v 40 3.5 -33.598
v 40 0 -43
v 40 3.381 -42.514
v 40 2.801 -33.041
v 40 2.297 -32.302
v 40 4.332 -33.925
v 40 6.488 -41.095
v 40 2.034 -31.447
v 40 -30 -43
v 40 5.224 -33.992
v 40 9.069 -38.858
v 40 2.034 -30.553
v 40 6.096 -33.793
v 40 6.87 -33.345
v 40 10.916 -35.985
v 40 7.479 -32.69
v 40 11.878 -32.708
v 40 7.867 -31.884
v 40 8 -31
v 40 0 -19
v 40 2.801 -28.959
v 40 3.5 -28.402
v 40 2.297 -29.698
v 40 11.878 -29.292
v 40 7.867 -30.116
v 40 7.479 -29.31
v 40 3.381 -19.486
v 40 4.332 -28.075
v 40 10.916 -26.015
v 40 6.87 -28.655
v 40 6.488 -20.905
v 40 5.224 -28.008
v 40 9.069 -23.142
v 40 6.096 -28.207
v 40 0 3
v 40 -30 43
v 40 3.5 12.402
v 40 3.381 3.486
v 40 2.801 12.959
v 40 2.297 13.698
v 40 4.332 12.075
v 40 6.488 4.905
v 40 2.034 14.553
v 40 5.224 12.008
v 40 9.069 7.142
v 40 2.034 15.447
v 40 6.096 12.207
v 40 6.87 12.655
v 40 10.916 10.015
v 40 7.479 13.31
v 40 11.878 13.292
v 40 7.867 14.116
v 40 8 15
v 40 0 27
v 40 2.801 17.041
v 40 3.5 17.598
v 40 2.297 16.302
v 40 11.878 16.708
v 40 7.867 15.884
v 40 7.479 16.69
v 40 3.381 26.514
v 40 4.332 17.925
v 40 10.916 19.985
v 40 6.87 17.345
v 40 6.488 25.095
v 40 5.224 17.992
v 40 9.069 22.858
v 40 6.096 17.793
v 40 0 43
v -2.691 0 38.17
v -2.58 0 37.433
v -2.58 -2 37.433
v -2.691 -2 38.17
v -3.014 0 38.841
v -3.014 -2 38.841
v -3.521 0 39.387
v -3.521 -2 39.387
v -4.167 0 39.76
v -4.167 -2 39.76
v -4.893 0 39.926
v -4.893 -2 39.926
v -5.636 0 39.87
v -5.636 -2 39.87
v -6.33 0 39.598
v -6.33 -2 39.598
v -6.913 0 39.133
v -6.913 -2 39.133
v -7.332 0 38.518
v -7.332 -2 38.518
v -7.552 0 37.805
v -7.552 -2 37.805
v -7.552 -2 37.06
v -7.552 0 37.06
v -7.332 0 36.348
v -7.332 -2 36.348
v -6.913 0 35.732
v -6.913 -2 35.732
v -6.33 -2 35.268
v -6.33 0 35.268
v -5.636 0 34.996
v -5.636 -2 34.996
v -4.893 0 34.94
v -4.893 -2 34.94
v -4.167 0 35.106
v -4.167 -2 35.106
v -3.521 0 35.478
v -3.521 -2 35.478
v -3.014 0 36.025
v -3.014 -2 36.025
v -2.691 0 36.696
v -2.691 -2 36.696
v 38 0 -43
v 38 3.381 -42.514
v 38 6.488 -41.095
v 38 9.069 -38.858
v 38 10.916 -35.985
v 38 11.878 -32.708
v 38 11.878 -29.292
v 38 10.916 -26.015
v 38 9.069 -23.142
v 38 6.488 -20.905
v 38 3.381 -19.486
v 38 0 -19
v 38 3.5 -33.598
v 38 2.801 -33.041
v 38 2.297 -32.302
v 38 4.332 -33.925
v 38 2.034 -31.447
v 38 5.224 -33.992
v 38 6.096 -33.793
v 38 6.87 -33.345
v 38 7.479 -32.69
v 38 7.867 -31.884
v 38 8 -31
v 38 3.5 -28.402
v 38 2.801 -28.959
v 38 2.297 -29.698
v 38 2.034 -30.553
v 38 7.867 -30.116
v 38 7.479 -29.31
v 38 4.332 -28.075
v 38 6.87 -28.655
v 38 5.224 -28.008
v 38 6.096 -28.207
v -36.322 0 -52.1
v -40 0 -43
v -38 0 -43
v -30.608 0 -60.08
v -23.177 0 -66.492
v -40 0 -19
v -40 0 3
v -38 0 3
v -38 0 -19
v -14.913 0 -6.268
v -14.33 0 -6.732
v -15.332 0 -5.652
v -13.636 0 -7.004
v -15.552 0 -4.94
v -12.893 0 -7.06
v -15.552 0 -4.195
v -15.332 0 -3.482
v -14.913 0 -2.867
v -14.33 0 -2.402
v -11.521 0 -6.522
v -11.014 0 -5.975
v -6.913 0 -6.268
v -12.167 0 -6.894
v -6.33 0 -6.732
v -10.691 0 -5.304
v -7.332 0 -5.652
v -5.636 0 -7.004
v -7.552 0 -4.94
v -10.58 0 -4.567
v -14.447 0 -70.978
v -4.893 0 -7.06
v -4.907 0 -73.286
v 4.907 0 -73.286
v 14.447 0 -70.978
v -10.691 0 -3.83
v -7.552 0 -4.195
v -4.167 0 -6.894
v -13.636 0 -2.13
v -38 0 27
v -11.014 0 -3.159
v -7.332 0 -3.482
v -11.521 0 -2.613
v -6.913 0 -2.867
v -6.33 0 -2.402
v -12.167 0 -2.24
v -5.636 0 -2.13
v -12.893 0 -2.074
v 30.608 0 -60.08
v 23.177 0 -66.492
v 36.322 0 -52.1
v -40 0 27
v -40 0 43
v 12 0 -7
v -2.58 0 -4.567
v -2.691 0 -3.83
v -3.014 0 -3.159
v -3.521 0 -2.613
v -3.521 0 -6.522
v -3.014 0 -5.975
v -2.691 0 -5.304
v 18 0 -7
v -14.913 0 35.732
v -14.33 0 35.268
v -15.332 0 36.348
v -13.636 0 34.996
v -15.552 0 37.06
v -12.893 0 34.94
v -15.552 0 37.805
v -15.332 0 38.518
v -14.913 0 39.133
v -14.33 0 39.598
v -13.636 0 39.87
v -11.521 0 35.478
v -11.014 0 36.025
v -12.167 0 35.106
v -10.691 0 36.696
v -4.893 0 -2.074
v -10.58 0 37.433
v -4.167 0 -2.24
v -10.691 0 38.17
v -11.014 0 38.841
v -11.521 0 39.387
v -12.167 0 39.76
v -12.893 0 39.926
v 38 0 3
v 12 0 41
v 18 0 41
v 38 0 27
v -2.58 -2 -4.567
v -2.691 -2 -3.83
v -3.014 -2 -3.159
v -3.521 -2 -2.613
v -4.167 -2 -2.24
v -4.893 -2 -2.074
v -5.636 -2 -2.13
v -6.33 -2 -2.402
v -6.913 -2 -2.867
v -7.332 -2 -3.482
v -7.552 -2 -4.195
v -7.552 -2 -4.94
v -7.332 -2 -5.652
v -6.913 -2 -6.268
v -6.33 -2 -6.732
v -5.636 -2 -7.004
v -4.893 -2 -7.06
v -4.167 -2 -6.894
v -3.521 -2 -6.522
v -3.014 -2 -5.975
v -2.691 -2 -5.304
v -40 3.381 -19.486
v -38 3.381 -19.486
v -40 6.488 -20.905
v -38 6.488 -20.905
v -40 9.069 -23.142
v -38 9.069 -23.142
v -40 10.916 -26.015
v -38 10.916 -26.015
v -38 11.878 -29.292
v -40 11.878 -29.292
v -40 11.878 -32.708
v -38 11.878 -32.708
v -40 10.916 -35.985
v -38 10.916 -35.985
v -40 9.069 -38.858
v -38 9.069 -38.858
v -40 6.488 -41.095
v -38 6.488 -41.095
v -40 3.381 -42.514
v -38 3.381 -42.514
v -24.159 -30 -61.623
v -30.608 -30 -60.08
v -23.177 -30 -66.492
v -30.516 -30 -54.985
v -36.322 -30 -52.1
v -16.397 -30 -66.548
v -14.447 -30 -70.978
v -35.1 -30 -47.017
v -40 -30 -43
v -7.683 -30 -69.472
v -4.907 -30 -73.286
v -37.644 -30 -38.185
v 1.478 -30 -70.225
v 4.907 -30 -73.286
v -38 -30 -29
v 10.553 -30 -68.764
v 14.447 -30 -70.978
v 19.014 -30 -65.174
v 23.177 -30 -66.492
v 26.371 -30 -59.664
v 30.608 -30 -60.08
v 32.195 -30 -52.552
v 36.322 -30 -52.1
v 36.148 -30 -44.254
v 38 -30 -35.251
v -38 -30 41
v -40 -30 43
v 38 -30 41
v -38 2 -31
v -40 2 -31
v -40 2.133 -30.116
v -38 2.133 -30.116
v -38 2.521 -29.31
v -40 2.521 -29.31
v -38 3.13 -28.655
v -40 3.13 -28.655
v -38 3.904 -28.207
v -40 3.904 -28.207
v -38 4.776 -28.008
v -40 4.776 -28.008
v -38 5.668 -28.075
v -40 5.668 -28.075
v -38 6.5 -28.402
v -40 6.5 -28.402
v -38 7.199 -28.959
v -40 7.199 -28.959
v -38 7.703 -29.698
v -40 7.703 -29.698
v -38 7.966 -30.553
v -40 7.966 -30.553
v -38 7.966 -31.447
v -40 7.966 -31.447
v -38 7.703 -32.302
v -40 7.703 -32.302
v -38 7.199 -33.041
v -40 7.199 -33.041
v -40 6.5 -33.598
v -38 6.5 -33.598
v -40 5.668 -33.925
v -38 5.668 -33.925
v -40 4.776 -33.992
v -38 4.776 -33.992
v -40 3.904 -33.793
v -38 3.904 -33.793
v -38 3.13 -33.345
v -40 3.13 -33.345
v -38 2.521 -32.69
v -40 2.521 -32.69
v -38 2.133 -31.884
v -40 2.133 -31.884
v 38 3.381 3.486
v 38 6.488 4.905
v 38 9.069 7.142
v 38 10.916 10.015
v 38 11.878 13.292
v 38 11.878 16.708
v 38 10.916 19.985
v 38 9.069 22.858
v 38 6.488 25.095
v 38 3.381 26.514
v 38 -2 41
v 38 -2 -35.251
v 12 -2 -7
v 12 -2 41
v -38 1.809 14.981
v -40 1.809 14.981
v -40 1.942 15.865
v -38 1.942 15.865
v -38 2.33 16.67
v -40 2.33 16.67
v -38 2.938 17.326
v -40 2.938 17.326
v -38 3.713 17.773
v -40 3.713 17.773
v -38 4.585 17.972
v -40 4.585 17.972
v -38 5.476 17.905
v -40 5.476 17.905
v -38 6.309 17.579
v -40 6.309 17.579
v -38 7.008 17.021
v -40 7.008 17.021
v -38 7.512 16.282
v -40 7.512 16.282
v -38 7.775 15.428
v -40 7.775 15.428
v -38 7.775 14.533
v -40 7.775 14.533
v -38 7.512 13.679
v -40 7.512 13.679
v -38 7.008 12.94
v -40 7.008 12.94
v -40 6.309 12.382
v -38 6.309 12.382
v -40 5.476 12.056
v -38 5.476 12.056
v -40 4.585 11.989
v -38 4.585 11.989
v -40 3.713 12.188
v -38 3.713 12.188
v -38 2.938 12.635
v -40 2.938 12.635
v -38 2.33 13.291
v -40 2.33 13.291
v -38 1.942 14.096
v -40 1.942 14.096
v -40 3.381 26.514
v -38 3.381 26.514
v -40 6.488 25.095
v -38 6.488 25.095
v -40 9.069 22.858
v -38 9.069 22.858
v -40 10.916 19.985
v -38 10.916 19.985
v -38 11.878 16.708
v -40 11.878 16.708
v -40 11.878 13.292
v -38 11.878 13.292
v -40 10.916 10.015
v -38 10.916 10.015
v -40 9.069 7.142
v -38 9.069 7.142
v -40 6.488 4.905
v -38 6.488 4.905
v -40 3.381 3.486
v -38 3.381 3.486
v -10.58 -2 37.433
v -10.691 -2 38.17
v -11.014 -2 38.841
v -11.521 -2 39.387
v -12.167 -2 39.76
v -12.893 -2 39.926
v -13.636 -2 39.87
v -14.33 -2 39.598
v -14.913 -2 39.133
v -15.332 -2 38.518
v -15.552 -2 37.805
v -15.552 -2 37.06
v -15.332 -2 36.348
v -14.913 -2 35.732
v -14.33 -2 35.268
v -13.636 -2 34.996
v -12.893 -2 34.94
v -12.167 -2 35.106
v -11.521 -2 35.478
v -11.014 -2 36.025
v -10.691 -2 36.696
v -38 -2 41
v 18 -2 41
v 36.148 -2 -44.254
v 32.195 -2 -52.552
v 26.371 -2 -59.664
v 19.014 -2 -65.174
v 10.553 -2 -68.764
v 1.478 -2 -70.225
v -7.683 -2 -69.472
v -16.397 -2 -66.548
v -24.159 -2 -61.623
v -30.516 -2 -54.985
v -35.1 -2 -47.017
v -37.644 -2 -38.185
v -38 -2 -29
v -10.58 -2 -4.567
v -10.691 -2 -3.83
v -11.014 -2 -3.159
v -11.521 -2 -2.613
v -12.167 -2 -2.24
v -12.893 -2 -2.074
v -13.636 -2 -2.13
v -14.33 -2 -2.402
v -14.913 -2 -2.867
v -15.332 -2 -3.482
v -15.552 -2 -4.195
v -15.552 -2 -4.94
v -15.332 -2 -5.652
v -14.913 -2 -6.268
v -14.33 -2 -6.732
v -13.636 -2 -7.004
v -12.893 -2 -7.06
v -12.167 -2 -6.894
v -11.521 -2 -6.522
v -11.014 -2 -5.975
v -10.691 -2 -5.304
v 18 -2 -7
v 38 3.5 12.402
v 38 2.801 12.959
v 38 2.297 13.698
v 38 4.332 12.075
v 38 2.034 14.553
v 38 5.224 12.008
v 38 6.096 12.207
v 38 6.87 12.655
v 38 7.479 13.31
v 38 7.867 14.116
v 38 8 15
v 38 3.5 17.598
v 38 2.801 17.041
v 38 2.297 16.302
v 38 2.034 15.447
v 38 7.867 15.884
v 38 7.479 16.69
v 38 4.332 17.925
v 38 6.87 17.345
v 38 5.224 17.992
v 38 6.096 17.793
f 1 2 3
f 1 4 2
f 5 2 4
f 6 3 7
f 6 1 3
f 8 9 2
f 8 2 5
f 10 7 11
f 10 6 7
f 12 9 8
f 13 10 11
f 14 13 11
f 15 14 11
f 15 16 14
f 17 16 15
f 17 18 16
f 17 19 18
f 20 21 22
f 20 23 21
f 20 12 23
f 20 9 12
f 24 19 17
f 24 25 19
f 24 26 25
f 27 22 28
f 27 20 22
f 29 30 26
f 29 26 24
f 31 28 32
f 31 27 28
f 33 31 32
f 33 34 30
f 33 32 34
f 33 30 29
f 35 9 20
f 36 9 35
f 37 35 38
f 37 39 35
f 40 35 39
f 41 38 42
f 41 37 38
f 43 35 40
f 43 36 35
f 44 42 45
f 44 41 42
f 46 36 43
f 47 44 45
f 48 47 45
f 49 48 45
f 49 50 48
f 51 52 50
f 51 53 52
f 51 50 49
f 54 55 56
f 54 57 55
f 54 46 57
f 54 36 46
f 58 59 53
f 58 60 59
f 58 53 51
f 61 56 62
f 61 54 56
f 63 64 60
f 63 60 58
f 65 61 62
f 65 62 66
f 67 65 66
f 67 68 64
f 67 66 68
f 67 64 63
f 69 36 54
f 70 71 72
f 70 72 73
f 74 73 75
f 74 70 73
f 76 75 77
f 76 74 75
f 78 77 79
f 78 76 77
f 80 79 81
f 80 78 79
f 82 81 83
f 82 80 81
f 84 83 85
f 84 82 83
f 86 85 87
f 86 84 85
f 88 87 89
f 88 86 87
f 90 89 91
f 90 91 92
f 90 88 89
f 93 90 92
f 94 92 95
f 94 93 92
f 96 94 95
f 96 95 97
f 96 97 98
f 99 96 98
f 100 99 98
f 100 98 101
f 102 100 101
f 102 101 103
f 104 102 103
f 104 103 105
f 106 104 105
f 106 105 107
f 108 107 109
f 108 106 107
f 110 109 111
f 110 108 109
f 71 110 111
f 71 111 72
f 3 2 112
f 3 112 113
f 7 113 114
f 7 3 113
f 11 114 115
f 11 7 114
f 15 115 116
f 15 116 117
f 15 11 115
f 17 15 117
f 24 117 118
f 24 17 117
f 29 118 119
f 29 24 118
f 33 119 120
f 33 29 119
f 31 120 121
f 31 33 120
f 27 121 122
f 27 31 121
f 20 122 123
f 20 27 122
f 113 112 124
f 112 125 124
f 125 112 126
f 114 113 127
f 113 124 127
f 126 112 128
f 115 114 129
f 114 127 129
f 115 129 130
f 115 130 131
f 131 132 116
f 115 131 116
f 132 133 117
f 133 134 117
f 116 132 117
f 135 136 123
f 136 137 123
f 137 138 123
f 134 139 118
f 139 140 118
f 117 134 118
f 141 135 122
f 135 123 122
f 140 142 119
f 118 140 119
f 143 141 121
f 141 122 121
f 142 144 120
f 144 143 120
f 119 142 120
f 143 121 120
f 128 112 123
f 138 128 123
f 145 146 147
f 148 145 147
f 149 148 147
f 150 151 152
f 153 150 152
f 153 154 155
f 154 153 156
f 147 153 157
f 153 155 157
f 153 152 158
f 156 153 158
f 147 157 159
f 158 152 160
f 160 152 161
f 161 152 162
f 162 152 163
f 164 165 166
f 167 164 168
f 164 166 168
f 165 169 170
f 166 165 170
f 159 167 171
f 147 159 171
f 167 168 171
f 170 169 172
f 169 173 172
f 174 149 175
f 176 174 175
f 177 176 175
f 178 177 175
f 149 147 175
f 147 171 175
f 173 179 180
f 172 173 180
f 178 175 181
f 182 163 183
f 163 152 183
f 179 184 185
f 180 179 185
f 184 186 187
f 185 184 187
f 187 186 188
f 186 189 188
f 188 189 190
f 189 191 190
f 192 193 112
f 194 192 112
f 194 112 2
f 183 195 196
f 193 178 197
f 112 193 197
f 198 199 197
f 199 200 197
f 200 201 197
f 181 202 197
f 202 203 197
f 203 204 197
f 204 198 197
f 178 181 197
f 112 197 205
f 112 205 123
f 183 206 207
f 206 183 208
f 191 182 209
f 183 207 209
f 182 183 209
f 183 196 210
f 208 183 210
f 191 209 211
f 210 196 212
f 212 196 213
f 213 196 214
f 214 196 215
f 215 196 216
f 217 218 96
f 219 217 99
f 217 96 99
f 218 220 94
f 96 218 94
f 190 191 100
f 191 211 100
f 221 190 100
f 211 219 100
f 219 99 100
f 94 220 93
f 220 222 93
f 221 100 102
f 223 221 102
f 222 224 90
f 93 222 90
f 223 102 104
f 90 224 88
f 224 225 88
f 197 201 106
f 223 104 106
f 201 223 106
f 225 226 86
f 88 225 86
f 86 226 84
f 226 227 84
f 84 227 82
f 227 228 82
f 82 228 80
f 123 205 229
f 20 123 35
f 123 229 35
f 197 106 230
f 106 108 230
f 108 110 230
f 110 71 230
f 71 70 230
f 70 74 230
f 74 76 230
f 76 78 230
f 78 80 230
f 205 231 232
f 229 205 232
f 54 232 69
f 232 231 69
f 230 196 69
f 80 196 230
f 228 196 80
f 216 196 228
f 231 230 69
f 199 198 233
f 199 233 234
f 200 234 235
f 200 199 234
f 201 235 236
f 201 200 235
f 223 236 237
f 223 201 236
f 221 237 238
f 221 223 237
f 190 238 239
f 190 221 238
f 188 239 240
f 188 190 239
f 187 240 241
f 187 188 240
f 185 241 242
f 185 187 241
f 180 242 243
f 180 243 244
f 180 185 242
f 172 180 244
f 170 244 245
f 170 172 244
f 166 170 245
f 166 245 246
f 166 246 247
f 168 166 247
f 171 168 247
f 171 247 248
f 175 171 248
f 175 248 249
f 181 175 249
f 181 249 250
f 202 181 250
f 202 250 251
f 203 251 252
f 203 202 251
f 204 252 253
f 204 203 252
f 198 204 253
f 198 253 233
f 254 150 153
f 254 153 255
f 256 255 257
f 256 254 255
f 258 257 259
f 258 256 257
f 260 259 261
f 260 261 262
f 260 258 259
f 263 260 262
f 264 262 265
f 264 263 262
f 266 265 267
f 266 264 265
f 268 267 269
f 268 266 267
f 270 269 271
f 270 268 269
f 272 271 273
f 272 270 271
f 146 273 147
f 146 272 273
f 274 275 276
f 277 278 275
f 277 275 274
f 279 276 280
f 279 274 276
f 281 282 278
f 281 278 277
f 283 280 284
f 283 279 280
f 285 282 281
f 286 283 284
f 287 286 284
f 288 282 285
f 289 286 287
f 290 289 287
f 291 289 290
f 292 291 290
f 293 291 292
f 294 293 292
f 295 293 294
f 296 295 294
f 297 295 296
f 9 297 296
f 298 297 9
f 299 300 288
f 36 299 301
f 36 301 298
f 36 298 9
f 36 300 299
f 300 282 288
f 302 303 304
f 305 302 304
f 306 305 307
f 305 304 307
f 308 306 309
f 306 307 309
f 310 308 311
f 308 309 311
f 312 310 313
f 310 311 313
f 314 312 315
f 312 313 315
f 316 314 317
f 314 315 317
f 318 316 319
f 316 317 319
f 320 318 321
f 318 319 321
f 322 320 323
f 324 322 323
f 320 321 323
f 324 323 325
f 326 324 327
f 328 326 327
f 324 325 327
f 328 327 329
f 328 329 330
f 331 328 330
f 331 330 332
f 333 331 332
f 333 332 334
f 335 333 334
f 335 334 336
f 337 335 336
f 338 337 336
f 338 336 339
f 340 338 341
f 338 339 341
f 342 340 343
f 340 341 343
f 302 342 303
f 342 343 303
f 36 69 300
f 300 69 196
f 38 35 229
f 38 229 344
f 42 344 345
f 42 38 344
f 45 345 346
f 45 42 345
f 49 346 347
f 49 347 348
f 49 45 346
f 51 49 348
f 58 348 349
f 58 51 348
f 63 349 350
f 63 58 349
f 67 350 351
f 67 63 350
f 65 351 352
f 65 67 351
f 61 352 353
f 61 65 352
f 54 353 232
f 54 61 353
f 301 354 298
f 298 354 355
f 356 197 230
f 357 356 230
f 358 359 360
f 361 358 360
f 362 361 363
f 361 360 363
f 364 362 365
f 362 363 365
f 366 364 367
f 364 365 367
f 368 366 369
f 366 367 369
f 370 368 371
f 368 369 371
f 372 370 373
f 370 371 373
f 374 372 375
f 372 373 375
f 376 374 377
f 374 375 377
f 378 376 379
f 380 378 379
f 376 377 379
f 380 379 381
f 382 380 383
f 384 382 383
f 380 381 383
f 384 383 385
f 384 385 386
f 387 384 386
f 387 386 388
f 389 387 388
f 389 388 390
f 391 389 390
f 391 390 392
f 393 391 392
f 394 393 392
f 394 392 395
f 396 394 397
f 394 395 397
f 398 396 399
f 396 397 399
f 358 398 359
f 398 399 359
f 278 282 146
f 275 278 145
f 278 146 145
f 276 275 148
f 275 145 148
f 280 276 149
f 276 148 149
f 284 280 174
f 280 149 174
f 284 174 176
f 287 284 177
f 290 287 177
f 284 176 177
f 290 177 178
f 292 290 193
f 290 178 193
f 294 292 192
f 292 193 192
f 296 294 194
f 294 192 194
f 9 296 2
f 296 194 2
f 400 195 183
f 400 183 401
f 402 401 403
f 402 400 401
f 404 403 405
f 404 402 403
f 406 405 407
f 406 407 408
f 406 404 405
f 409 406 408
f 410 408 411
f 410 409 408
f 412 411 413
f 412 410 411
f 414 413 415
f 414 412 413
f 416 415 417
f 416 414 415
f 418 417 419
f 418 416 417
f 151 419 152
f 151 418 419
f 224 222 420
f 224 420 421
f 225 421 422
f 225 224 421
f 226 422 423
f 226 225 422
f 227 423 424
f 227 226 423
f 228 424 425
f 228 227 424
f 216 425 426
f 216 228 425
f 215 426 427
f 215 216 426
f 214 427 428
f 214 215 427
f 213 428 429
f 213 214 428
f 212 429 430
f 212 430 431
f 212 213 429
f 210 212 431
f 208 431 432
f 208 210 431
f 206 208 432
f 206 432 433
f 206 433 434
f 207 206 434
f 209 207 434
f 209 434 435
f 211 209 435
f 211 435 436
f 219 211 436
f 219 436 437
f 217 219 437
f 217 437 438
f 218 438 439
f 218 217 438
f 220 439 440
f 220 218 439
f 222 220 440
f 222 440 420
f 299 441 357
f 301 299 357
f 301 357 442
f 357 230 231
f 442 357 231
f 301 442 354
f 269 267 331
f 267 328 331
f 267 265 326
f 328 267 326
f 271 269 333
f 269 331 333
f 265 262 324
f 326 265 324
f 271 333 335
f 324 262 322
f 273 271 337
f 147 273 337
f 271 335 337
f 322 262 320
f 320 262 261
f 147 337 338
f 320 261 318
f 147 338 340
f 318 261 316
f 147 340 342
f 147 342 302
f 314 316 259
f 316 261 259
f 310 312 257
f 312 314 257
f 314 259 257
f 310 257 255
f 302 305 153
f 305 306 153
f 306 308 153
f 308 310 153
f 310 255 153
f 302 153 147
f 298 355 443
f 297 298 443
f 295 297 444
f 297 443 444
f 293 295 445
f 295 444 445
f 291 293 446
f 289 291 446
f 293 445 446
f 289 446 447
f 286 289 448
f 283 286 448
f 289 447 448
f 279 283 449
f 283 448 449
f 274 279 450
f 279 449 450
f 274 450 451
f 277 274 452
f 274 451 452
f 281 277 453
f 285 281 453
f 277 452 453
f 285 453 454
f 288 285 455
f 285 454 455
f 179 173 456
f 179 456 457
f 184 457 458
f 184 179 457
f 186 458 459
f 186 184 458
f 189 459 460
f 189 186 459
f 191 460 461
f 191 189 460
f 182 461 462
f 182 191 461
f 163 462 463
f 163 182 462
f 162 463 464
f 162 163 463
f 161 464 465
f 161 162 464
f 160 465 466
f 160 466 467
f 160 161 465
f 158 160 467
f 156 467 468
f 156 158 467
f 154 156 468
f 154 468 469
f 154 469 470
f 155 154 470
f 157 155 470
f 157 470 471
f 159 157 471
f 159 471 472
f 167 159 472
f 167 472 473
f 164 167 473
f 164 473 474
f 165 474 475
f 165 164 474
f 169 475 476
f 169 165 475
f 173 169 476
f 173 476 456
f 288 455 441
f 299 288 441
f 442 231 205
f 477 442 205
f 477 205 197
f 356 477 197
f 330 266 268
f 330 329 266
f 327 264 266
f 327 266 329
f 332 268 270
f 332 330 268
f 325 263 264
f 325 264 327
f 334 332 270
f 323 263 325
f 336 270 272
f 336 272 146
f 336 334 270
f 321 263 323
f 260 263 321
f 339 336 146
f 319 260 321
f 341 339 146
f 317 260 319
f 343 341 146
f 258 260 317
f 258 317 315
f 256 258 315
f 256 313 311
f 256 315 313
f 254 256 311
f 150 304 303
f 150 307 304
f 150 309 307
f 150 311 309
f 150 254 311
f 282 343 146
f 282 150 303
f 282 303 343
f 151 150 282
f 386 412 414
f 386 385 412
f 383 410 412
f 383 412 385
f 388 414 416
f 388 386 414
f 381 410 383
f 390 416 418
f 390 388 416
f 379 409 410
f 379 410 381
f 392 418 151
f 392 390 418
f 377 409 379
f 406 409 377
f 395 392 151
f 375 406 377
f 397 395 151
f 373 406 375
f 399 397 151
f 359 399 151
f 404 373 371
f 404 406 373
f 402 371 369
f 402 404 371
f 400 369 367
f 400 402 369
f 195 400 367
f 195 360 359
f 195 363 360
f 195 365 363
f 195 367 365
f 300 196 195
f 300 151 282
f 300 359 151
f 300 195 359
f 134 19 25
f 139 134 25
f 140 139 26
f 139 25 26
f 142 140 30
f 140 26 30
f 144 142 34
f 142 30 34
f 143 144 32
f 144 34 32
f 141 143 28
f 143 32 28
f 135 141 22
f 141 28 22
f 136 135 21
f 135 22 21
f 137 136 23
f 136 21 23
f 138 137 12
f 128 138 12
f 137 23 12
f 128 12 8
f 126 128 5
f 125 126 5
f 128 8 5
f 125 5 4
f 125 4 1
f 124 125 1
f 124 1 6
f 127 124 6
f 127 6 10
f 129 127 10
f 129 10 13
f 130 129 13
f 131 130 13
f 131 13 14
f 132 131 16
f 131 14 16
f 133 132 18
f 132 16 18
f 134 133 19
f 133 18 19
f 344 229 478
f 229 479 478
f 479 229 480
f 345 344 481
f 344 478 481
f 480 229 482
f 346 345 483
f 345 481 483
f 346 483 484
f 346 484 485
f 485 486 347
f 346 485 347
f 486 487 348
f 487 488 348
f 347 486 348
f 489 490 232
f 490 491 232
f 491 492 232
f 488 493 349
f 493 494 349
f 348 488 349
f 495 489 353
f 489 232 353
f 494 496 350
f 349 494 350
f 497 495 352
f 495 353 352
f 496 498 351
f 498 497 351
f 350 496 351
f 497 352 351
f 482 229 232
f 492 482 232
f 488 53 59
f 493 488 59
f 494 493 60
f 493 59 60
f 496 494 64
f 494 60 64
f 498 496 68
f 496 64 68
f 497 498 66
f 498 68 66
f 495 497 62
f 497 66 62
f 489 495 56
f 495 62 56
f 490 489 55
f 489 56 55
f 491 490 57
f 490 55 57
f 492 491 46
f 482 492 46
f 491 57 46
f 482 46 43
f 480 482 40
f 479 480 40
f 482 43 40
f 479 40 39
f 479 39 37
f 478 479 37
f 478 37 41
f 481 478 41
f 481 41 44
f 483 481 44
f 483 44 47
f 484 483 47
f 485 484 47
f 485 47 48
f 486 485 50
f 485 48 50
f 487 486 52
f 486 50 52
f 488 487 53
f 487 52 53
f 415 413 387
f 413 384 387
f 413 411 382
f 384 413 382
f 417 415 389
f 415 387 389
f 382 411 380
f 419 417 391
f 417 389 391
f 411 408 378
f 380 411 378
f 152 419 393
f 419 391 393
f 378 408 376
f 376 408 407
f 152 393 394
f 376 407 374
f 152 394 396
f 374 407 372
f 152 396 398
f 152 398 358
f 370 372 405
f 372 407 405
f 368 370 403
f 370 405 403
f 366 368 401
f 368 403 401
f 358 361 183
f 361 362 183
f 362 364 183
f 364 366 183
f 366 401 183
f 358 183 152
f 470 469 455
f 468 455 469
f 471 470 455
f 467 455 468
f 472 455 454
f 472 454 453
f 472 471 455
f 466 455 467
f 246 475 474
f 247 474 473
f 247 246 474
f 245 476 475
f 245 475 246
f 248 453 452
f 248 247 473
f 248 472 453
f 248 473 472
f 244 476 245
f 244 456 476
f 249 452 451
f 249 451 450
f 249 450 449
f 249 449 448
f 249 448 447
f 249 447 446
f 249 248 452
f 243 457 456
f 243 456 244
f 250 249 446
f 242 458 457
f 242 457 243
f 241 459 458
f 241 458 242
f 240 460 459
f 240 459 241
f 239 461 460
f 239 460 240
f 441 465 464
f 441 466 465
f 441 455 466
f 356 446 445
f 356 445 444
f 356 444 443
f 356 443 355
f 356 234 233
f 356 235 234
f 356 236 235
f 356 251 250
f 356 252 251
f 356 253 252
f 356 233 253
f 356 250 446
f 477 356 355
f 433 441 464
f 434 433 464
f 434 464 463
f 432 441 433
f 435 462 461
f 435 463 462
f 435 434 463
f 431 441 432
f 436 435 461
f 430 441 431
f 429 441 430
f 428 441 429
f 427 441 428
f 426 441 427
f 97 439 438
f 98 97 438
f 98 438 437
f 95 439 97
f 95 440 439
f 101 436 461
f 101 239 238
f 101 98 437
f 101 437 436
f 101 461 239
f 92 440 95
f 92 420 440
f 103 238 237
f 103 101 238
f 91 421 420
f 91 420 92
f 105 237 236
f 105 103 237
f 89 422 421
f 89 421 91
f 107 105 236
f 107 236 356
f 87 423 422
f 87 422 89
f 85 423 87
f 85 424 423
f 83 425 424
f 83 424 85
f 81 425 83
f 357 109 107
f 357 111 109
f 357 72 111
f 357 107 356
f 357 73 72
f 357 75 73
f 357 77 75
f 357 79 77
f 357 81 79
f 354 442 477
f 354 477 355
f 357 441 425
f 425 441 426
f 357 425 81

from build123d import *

# Parameters (mm, degrees)
F1_DEPTH = 30
F0_R     = 2.5
F2_DEPTH = 2
F3_R     = 3
F4_DEPTH = 2
F5_R     = 3
F6_DEPTH = 2


with BuildPart() as f1:
    # F0 (on Front) → F1 (new body)
    with BuildSketch(Plane.XZ):
        with BuildLine():
            Line((40, -43), (40, 43))
            Line((40, 43), (-40, 43))
            Line((-40, 43), (-40, -43))
            ThreePointArc((-40, -43), (0, -73.5773), (40, -43))
        make_face()
        with BuildLine():
            Line((-38, -29), (-38, 41))
            Line((-38, 41), (12, 41))
            Line((12, 41), (18, 41))
            Line((18, 41), (38, 41))
            Line((38, 41), (38, -35.250901))
            ThreePointArc((38, -35.250901), (-3.125451, -70.125451), (-38, -29))
        make_face(mode=Mode.SUBTRACT)
    extrude(amount=F1_DEPTH)

    # F0 (on Front) → F2 (join)
    with BuildSketch(Plane.XZ):
        with BuildLine():
            Line((12, 41), (-38, 41))
            Line((-38, 41), (-38, -29))
            ThreePointArc((-38, -29), (-3.125451, -70.125451), (38, -35.250901))
            Line((38, -35.250901), (38, 41))
            Line((38, 41), (18, 41))
            Line((18, 41), (18, -7))
            Line((18, -7), (12, -7))
            Line((12, -7), (12, 41))
        make_face()
        with Locations((-13.079933, -4.567117)):
            Circle(F0_R, mode=Mode.SUBTRACT)
        with Locations((-5.079933, -4.567117)):
            Circle(F0_R, mode=Mode.SUBTRACT)
        with Locations((-13.079933, 37.432883)):
            Circle(F0_R, mode=Mode.SUBTRACT)
        with Locations((-5.079933, 37.432883)):
            Circle(F0_R, mode=Mode.SUBTRACT)
    extrude(amount=F2_DEPTH)

    # F3 (on face) → F4 (join)
    with BuildSketch(Plane.YZ.offset(40)):
        with BuildLine():
            Line((0, 27), (0, 3))
            ThreePointArc((0, 3), (12, 15), (0, 27))
        make_face()
        with Locations((5, 15)):
            Circle(F3_R, mode=Mode.SUBTRACT)
        with BuildLine():
            Line((0, -19), (0, -43))
            ThreePointArc((0, -43), (12, -31), (0, -19))
        make_face()
        with Locations((5, -31)):
            Circle(F3_R, mode=Mode.SUBTRACT)
    extrude(amount=-F4_DEPTH)

    # F5 (on face) → F6 (join)
    with BuildSketch(Plane(origin=(-40, 0, 0), x_dir=(0, -1, 0), z_dir=(-1, 0, 0))):
        with BuildLine():
            Line((0, -43), (0, -19))
            ThreePointArc((0, -19), (-12, -31), (0, -43))
        make_face()
        with Locations((-5, -31)):
            Circle(F5_R, mode=Mode.SUBTRACT)
        with BuildLine():
            Line((0, 3), (0, 27))
            ThreePointArc((0, 27), (-12, 15), (0, 3))
        make_face()
        with Locations((-4.808913, 14.980538)):
            Circle(F5_R, mode=Mode.SUBTRACT)
    extrude(amount=-F6_DEPTH)


solid = f1.part
